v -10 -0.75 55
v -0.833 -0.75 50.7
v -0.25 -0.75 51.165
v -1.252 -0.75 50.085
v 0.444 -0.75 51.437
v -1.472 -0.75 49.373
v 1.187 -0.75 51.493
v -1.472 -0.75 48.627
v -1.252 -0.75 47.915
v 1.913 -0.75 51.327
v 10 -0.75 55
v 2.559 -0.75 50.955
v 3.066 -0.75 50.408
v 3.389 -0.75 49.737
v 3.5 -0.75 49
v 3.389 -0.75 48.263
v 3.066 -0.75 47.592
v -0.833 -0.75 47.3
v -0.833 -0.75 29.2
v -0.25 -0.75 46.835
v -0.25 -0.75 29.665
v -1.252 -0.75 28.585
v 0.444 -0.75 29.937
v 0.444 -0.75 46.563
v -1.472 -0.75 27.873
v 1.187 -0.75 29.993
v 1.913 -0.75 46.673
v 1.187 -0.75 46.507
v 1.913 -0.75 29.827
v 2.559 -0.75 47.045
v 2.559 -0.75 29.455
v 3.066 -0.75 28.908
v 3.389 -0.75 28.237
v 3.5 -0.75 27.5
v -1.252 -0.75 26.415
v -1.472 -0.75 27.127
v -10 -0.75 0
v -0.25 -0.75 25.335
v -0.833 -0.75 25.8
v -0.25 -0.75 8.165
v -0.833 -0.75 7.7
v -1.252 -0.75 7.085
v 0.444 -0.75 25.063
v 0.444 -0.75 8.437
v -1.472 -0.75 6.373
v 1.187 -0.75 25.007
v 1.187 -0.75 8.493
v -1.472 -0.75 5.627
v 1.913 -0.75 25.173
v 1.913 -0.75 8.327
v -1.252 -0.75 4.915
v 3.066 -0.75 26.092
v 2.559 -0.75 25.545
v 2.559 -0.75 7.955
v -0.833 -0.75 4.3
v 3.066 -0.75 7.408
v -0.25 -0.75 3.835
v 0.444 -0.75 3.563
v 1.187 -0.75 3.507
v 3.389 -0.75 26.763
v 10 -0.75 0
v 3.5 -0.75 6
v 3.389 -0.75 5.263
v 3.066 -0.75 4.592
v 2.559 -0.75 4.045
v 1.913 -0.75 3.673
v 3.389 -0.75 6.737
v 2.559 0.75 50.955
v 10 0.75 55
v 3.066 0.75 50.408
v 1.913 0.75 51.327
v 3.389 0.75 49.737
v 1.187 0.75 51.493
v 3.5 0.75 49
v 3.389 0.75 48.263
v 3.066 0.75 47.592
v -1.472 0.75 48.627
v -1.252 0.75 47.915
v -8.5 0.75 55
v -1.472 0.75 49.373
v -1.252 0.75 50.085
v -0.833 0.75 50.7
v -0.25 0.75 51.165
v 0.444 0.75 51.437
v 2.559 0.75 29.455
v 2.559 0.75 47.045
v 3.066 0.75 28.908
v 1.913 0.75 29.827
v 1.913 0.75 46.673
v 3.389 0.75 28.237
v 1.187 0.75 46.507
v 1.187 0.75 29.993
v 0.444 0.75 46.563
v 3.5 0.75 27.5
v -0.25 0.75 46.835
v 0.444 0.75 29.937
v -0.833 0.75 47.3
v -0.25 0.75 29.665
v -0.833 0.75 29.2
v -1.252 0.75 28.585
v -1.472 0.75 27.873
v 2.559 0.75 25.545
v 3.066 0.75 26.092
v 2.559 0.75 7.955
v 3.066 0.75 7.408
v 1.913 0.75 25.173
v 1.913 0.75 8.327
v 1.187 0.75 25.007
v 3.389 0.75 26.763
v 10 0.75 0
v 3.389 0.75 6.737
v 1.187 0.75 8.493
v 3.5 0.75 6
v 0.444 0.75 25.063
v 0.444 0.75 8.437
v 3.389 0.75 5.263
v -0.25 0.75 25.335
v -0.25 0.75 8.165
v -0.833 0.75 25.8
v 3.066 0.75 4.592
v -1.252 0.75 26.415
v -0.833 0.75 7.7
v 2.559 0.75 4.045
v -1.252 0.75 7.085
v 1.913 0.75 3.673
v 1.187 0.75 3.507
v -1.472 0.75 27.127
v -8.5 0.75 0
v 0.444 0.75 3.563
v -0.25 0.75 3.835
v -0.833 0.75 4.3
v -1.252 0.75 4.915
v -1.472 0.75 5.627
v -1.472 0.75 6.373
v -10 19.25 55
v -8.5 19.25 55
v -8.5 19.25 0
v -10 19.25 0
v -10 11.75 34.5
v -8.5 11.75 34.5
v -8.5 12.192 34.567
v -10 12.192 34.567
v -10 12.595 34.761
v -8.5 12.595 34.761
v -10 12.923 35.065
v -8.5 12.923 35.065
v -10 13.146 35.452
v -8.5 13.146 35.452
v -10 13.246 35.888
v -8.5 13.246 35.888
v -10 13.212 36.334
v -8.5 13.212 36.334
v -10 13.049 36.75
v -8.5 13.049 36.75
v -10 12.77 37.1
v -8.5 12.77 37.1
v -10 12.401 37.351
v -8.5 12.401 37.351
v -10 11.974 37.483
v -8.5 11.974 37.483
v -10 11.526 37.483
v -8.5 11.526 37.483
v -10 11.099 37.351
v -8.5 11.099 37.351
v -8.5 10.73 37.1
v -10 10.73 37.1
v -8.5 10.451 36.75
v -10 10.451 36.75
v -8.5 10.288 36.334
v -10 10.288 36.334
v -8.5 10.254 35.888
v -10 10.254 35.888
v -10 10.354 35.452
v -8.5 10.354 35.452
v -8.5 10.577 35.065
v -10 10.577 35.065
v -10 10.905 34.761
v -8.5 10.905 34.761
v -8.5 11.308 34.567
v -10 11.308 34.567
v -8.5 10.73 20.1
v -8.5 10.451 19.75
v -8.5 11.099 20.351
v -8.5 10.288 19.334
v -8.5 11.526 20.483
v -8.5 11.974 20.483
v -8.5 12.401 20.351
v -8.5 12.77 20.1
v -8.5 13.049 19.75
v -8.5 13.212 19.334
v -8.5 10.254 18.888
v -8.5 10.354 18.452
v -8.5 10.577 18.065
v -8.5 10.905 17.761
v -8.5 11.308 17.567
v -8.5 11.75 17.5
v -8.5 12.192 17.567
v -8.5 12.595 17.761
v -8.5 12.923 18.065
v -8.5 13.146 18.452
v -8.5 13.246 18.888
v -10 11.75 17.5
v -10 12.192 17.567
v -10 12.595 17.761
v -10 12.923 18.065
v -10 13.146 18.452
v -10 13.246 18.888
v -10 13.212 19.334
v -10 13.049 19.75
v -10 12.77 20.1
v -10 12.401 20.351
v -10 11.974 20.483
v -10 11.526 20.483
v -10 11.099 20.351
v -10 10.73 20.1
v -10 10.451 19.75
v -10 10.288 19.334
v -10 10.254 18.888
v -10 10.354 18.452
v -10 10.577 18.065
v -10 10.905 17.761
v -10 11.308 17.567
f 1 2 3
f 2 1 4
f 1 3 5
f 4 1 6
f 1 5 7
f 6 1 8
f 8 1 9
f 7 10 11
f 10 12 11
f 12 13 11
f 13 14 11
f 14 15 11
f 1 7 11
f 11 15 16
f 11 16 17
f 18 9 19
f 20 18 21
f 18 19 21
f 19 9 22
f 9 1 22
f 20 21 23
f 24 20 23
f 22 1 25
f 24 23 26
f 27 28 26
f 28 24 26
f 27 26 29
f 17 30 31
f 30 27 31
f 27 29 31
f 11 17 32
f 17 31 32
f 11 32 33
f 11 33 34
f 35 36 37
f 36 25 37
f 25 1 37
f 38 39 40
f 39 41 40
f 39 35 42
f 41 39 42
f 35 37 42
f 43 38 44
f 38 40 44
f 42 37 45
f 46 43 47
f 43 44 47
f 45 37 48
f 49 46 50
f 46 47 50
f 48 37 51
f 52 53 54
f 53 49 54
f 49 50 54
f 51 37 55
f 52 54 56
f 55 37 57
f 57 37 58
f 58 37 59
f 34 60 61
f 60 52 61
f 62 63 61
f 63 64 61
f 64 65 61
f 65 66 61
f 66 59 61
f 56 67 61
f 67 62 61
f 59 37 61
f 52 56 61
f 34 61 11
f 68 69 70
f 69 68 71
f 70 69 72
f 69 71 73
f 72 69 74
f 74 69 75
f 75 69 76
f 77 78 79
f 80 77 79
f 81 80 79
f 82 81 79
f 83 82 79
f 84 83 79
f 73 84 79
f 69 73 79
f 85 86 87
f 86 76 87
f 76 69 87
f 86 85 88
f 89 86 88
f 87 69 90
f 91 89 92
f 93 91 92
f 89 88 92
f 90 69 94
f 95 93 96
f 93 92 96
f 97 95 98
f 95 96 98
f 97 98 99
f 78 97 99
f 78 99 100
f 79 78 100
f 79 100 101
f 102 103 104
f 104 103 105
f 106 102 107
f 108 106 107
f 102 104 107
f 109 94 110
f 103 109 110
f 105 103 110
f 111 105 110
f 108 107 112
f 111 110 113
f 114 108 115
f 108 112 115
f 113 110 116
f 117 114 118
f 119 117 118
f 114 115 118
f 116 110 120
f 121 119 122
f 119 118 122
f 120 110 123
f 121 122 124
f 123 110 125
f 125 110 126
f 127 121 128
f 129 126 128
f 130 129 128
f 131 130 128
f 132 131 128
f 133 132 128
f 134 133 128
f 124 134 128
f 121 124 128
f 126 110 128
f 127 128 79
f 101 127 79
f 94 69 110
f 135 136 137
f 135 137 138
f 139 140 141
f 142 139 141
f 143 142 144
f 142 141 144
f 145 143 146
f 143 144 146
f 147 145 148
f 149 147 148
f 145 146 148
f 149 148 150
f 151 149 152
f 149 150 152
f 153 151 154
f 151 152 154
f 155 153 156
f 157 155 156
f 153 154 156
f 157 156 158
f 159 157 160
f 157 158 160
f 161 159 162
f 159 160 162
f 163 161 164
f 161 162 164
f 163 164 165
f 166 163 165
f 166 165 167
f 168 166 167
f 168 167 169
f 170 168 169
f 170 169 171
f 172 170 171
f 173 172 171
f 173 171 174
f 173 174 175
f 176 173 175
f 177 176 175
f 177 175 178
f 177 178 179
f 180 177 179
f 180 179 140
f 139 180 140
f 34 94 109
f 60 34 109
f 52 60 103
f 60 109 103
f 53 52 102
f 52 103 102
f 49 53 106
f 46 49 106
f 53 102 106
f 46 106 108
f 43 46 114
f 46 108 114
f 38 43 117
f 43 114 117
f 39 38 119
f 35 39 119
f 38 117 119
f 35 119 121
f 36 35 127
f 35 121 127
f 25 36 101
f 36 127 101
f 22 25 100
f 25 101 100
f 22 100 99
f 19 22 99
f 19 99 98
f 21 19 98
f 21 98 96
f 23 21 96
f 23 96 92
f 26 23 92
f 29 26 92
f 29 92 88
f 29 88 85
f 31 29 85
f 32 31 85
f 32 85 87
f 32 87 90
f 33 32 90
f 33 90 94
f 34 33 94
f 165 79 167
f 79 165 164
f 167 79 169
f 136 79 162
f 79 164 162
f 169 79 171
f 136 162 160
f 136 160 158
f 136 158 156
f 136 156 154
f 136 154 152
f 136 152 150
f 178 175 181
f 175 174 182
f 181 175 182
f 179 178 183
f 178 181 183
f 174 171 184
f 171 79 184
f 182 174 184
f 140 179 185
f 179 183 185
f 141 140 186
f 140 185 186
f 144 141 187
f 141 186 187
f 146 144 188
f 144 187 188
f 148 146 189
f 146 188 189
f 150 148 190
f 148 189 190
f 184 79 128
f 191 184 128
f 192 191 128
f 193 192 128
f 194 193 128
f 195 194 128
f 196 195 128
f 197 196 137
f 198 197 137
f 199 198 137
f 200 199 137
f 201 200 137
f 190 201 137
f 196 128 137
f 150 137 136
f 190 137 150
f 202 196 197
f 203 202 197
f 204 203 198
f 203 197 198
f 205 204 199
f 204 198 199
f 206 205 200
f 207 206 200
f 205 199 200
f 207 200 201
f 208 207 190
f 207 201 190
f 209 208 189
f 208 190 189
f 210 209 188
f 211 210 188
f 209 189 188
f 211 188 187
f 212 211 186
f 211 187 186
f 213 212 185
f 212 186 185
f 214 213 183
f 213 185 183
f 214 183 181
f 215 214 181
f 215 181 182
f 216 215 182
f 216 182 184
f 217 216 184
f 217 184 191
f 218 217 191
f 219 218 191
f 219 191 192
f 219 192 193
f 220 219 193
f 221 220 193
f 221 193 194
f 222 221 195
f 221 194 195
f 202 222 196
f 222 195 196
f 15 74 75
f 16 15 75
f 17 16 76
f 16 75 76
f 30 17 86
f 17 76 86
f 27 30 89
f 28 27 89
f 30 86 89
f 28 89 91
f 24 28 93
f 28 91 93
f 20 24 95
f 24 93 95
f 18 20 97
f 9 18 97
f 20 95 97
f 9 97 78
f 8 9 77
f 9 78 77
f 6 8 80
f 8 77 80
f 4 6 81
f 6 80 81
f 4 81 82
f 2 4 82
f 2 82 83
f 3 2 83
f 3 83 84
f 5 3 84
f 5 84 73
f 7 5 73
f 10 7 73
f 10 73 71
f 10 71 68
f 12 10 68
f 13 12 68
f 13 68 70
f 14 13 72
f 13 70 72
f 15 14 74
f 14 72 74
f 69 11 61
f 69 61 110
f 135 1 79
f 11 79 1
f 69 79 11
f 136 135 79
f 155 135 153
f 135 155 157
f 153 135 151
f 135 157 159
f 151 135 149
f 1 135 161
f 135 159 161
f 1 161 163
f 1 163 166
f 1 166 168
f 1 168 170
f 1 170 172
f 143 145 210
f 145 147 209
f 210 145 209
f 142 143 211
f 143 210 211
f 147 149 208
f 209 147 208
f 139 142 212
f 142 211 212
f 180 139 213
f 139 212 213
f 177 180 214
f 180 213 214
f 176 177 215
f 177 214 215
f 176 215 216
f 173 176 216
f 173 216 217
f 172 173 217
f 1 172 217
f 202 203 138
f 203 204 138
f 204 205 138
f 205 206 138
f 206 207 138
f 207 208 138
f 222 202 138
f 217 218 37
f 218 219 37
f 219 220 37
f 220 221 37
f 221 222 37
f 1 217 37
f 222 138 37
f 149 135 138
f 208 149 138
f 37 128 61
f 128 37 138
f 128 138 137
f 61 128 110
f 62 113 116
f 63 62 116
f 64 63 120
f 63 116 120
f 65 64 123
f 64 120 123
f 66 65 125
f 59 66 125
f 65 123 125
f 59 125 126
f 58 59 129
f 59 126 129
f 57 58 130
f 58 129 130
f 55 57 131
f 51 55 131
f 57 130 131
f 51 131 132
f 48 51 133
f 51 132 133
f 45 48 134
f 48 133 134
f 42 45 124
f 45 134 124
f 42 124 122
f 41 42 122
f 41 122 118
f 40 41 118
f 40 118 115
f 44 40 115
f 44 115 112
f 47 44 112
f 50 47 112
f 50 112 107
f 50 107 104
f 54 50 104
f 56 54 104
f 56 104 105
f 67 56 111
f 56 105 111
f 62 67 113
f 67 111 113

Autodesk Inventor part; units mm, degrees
ref_plane "YZ Plane" through (0, 0, 0) normal (1, 0, 0) x (0, 1, 0)
ref_plane "XZ Plane" through (0, 0, 0) normal (0, 1, 0) x (-1, 0, 0)
ref_plane "XY Plane" through (0, 0, 0) normal (0, 0, 1) x (1, 0, 0)
sketch "Skizze1" plane through (0, 0, 0) normal (0, 0, 1) x (1, 0, 0)
  line L0 (-14, 0) -> (14, 0) projected
  line L1 (0, -4.75) -> (0, 23.25) projected
  line L2 (-10, -0.75) -> (10, -0.75)
  line L3 (10, -0.75) -> (10, 0.75)
  line L4 (10, 0.75) -> (-10, 0.75)
  line L5 (-10, 0.75) -> (-10, -0.75)
  line L6 (-10, -0.75) -> (-8.5, -0.75)
  line L7 (-8.5, -0.75) -> (-8.5, 19.25)
  line L8 (-8.5, 19.25) -> (-10, 19.25)
  line L9 (-10, 19.25) -> (-10, -0.75)
  point P0 (0, 0)
  dimension "d0" = 20
  dimension "d1" = 1.5
  dimension "d2" = 1.5
  dimension "d3" = 20
extrude "Extrusion1" add sketch "Skizze1" along normal blind 55
sketch "Skizze2" plane through (-8.5, 0.75, 0) normal (0, 1, 0) x (1, 0, 0)
  line L0 (0, -55) -> (0, 0) projected
  line L1 (18.5, -55) -> (0, -55) projected
  line L2 (18.5, 0) -> (18.5, -55) projected
  line L3 (18.5, 0) -> (0, 0) projected
  circle A0 centre (9.5, -49) radius 2.5
  circle A1 centre (9.5, -6) radius 2.5
  circle A2 centre (9.5, -27.5) radius 2.5
  line L4 (18.5, -55) -> (0, -55) projected
  line L5 (18.5, 0) -> (0, 0) projected
  point P0 (8.5, 0)
  dimension "d6" = 5
  dimension "d7" = 5
  dimension "d8" = 6
  dimension "d9" = 6
  dimension "d10" = 9
  dimension "d13" = 5
  dimension "d15" = 55
  dimension "d16" = 27.5
extrude "Extrusion2" cut sketch "Skizze2" against normal blind 1.5 contours A0 | A1 | A2
sketch "Skizze3" plane through (-8.5, 0.75, 0) normal (1, 0, 0) x (0, 0, -1)
  circle A0 centre (-36, 11) radius 1.5
  line L0 (-55, 0) -> (0, 0) projected
  line L1 (0, 0) -> (0, 18.5) projected
  line L2 (0, 18.5) -> (-55, 18.5) projected
  line L3 (-55, 0) -> (-55, 18.5) projected
  circle A1 centre (-19, 11) radius 1.5
  point P0 (0, -0.75)
  dimension "d17" = 3
  dimension "d18" = 7.5
  dimension "d19" = 19
  dimension "d22" = 3
  dimension "d23" = 19
  dimension "d24" = 7.5
extrude "Extrusion3" cut sketch "Skizze3" against normal blind 1.5 contours A0 | A1
equation "\"d9\" = d8"
equation "\"d16\" = 0.5 * d15"
equation "\"d22\" = d17"
equation "\"d23\" = d19"
equation "\"d24\" = d18"
properties part number "Z-Stage_Wheel_plate_20x20" material "Aluminium 6061"
